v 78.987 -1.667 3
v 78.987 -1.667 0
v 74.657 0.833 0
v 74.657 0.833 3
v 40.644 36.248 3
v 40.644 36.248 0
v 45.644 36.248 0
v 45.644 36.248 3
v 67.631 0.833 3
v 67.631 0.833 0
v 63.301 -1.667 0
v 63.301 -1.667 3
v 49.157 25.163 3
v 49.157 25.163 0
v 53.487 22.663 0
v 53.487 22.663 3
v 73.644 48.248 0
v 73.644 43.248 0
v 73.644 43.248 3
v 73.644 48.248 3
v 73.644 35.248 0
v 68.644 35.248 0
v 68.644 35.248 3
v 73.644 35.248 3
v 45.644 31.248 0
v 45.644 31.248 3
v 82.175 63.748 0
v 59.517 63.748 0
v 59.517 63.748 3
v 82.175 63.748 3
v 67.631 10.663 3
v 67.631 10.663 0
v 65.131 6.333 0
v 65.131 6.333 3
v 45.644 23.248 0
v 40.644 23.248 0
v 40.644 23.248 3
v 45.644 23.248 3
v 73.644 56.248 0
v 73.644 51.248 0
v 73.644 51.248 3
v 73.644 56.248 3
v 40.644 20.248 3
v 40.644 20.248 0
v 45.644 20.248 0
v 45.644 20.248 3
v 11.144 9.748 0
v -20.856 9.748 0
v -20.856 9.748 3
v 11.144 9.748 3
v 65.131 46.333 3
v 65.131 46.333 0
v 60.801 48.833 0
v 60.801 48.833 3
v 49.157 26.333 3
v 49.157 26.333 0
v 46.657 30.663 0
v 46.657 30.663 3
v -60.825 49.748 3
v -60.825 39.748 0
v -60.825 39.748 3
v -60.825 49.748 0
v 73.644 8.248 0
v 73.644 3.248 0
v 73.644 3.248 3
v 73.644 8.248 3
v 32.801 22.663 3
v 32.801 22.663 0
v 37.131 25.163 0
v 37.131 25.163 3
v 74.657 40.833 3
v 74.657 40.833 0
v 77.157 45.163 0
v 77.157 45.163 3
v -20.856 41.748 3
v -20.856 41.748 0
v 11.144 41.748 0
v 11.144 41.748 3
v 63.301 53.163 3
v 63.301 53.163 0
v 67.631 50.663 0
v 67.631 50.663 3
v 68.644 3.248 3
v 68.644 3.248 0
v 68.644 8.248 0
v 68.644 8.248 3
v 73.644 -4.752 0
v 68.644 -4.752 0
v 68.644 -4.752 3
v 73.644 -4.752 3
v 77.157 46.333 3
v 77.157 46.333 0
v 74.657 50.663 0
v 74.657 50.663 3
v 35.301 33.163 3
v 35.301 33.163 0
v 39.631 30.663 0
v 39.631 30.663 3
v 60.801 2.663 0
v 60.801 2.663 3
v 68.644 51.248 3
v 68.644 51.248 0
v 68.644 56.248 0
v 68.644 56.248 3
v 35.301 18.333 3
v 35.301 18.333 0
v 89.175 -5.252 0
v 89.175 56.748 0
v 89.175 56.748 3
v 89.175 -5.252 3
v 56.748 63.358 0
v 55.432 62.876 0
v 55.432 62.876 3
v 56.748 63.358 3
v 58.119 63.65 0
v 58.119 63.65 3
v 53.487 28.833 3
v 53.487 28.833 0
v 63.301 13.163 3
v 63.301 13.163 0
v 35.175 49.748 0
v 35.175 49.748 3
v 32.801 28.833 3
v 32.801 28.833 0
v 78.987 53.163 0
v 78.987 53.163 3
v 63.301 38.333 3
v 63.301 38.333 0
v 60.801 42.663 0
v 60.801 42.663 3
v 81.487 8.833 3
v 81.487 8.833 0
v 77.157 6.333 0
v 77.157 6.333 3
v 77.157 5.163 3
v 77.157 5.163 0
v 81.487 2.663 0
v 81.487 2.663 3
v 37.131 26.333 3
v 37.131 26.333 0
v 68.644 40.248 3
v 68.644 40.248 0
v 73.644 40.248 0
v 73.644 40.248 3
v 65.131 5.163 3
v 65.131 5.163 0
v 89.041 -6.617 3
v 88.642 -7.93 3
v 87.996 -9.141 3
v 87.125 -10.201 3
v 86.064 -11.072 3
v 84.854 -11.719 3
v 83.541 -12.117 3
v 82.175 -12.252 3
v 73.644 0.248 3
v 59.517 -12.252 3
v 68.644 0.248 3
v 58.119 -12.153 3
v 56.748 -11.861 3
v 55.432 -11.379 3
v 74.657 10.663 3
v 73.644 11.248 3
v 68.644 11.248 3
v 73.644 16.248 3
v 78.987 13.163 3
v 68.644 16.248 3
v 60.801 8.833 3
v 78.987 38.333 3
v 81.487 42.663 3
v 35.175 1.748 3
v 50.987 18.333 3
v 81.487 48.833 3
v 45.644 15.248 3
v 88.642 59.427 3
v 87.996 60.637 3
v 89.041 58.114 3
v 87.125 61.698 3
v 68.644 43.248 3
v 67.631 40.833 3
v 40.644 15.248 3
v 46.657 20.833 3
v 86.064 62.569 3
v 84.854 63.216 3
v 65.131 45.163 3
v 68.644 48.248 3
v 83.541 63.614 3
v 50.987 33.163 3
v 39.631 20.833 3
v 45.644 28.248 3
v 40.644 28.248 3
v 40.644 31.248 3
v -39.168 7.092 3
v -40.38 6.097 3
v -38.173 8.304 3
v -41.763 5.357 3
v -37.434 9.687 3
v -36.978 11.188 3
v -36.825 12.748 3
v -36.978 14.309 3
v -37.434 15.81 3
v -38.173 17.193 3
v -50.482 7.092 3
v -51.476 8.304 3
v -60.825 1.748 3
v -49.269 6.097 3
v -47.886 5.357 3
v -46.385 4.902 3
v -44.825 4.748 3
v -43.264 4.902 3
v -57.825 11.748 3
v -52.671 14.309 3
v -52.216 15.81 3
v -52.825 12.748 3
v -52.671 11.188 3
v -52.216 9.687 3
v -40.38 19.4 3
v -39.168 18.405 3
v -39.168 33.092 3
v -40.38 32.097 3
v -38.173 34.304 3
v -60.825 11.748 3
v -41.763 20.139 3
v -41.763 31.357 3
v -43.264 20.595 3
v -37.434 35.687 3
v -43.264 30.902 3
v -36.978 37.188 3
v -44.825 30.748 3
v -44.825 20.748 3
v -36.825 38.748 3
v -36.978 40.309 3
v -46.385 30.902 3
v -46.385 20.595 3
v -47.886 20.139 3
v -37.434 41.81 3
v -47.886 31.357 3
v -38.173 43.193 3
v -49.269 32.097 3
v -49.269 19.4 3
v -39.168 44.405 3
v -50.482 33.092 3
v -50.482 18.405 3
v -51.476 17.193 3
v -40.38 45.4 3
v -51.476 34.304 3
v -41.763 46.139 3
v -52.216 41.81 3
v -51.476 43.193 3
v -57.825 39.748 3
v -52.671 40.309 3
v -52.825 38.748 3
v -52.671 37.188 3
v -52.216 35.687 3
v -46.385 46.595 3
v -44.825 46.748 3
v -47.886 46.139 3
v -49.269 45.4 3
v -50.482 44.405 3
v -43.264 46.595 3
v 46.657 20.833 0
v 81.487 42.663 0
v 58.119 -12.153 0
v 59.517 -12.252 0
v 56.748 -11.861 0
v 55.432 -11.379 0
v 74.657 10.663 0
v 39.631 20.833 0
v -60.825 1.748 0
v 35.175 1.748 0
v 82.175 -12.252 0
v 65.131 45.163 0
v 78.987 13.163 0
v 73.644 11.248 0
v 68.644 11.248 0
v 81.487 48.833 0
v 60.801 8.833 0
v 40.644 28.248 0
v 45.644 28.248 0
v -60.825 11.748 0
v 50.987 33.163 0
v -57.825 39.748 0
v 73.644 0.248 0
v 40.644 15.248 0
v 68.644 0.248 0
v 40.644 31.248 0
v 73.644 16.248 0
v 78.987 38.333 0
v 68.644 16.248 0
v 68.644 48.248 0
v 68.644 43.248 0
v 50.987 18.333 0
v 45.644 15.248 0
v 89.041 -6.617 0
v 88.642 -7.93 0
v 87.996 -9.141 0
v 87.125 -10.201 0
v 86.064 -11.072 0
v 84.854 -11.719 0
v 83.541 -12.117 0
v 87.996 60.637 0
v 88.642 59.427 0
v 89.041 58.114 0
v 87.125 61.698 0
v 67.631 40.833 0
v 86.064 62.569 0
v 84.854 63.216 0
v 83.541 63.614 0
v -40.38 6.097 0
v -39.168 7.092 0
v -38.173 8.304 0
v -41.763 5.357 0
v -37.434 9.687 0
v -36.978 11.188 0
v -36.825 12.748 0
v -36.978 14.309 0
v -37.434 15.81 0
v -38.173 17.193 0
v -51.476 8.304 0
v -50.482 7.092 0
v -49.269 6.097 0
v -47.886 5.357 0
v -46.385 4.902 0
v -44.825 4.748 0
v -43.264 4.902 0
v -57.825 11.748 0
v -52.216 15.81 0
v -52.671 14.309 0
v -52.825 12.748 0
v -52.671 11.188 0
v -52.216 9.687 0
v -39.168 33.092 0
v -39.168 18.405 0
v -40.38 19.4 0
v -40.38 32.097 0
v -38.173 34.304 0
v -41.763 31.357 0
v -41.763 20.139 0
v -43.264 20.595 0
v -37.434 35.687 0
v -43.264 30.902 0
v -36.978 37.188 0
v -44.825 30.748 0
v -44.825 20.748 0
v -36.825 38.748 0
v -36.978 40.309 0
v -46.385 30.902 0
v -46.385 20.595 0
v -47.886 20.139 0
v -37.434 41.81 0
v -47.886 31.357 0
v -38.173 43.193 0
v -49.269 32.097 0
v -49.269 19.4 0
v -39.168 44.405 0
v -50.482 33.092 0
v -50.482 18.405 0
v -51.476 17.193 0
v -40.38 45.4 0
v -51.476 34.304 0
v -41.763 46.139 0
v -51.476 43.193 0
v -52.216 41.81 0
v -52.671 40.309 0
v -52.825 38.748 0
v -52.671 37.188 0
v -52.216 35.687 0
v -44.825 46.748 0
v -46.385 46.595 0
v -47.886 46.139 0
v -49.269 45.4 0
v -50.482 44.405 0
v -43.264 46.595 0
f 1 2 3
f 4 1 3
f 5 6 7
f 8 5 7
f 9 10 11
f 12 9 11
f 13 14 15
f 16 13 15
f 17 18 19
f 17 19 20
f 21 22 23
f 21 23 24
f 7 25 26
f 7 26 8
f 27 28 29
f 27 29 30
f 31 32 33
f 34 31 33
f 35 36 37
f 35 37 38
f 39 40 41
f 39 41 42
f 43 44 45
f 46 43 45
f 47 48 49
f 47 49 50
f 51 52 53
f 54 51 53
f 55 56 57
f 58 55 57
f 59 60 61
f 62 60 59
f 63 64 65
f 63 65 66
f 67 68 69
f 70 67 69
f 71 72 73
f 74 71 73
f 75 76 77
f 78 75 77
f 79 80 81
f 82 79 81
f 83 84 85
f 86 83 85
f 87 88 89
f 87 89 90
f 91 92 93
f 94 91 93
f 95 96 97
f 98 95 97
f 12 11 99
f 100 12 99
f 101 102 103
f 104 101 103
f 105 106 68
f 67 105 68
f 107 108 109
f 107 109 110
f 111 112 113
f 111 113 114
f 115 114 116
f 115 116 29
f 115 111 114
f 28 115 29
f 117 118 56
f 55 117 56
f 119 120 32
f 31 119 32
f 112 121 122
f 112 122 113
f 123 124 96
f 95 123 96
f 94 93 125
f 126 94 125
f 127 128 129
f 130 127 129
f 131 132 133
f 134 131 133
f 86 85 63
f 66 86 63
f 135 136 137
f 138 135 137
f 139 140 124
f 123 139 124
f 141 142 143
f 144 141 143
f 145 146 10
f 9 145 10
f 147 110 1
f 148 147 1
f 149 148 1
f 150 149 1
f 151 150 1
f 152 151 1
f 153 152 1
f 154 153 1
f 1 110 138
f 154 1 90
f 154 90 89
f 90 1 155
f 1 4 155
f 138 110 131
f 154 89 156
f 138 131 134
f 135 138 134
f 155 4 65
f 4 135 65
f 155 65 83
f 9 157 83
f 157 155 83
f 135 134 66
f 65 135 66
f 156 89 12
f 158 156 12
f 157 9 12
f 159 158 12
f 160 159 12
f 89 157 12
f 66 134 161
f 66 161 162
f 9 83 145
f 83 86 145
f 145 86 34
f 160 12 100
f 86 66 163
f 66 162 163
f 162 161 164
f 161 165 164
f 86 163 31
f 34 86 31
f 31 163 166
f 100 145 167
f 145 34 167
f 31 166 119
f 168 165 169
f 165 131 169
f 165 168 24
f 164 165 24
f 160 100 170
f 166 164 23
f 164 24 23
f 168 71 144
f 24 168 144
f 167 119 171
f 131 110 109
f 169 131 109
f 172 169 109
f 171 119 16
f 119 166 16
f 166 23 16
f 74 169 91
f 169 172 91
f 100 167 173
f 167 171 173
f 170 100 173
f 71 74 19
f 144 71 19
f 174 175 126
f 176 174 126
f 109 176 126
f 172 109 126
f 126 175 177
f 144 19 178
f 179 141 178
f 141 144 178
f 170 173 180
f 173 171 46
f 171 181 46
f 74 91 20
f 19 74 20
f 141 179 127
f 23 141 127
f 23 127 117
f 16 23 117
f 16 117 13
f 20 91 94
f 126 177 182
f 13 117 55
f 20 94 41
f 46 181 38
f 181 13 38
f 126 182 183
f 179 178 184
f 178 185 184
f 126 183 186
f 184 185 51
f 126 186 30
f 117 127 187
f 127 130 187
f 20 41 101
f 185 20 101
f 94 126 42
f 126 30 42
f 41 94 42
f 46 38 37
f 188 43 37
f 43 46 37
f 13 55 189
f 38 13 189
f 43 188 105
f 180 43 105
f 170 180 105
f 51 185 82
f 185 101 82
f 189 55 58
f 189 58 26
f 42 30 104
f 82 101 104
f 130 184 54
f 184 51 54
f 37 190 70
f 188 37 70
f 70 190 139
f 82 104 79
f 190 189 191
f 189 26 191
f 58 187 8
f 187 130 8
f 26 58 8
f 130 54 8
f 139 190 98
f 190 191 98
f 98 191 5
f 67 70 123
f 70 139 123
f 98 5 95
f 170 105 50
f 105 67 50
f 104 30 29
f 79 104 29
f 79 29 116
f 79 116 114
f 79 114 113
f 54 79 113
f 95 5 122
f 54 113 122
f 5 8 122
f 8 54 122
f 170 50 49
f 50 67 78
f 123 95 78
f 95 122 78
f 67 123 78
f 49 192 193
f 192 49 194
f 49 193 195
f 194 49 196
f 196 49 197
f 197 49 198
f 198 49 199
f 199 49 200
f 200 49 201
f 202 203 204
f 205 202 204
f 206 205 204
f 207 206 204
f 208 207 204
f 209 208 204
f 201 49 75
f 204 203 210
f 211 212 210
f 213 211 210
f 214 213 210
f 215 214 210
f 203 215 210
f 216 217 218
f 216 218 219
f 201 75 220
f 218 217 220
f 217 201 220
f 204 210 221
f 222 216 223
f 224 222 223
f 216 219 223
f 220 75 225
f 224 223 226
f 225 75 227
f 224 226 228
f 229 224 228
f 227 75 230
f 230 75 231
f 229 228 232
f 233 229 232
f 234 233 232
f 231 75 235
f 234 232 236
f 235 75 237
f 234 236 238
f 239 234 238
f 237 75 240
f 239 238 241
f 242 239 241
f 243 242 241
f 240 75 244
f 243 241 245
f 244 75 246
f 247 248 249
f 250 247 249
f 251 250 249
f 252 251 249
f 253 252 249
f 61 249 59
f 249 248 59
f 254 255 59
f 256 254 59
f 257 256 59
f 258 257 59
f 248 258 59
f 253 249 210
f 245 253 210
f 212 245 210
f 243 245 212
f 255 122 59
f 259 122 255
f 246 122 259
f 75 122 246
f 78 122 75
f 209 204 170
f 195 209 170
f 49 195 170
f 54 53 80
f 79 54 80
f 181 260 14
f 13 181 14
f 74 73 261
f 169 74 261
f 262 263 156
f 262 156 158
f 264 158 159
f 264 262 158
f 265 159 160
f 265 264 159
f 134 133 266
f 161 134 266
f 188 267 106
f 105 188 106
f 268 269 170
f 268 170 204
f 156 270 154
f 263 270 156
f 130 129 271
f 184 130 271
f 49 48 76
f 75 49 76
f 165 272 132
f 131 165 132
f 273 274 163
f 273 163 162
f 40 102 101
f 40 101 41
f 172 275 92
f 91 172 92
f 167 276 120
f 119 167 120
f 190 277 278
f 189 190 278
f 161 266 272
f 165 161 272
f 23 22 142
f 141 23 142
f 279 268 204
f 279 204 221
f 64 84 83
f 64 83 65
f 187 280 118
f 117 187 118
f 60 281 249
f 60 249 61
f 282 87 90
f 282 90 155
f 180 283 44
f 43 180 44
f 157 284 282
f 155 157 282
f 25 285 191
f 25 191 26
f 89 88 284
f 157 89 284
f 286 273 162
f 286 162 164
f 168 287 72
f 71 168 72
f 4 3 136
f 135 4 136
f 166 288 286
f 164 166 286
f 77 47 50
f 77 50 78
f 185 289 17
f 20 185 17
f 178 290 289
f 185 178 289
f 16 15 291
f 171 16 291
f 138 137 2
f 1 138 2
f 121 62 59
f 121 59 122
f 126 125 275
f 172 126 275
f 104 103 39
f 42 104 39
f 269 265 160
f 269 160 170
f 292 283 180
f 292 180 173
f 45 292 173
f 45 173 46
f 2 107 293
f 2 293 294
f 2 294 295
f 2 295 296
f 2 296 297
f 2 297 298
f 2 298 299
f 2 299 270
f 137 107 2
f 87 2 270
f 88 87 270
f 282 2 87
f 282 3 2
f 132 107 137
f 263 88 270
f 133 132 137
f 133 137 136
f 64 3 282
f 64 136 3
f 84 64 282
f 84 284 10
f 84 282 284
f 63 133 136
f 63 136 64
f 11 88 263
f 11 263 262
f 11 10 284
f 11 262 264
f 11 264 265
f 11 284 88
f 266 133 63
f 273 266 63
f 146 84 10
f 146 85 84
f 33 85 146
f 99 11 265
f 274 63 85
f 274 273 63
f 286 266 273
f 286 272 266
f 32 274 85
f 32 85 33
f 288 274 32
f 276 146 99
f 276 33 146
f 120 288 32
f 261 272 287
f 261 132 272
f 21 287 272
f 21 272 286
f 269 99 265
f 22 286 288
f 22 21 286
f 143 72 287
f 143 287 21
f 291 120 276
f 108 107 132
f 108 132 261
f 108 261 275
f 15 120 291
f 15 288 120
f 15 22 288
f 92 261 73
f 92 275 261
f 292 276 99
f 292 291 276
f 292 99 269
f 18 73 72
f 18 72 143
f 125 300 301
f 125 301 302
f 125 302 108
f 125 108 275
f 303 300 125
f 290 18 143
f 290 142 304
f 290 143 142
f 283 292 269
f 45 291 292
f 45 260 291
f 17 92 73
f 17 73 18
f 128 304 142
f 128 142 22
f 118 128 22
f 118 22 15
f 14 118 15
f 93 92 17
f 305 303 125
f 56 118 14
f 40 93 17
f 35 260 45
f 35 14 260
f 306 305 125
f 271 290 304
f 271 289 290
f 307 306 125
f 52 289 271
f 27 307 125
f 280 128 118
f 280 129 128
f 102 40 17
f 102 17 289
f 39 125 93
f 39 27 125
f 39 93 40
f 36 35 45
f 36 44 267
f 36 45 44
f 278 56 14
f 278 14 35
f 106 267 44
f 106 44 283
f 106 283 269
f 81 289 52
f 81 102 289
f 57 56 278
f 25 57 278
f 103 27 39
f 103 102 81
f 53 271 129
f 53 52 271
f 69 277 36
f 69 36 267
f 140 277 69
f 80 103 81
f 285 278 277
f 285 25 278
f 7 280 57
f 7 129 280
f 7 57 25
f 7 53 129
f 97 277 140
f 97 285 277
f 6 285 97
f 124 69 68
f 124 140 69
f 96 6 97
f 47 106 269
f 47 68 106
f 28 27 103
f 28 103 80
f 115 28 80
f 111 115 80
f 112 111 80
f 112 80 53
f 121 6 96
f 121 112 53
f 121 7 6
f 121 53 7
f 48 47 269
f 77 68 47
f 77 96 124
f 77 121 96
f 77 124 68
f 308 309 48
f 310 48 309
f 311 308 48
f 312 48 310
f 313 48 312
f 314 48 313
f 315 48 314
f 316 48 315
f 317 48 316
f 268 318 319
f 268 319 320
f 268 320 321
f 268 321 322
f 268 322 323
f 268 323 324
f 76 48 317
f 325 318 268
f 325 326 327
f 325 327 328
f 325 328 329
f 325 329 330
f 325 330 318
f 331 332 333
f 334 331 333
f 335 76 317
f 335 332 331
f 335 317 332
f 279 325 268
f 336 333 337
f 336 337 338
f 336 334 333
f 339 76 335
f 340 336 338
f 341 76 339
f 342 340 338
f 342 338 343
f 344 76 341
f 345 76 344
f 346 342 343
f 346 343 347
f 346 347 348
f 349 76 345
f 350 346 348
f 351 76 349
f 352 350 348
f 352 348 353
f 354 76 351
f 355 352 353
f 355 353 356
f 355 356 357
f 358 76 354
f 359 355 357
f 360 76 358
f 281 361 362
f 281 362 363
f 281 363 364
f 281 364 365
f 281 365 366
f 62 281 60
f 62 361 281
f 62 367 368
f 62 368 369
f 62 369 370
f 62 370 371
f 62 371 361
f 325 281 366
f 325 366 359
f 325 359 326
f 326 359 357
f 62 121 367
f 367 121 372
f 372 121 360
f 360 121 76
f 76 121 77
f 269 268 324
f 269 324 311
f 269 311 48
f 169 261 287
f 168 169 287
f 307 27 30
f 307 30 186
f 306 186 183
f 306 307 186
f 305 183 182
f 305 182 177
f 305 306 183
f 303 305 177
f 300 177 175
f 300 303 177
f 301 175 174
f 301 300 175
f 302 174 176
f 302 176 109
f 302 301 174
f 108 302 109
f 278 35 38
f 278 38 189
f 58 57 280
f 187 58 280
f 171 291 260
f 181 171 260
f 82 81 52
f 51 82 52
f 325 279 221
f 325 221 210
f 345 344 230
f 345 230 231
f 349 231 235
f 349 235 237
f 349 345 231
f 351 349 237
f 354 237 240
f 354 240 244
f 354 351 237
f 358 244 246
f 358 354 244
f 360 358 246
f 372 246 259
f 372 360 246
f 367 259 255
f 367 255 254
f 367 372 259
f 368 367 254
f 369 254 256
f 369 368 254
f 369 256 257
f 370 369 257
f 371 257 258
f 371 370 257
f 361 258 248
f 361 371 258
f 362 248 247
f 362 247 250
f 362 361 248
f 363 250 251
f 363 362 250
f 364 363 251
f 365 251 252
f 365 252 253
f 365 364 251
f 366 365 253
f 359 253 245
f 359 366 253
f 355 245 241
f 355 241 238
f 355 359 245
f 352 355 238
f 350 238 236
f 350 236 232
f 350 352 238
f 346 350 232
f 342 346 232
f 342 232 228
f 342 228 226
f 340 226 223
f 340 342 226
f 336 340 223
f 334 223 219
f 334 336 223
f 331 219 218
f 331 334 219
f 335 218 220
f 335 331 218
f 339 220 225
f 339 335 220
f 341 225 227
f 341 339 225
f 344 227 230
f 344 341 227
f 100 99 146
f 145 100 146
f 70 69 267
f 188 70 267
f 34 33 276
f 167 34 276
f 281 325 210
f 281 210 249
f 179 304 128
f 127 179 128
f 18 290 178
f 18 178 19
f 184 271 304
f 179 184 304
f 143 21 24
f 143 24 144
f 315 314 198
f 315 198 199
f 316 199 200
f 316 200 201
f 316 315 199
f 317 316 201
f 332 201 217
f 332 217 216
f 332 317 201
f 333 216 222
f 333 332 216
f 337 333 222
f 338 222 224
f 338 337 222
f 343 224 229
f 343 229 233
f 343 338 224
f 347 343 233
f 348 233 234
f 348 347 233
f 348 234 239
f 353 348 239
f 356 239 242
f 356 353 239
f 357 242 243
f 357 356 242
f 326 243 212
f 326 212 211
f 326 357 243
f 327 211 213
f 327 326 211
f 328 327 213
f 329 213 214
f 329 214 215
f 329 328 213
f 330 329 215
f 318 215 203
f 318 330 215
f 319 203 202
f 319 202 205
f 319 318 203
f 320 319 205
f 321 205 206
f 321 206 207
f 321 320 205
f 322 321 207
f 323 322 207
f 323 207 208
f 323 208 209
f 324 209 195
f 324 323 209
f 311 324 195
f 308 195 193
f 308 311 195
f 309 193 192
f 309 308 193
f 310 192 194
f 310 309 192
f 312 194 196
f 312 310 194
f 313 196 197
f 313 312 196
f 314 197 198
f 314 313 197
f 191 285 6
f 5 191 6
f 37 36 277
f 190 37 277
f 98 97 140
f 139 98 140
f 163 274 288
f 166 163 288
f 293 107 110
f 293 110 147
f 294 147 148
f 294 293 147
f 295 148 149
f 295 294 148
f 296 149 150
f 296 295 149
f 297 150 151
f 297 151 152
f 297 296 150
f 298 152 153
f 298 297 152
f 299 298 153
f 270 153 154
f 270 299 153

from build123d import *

# Parameters (mm, degrees)
MODEL_R                 = 8
MODEL_W                 = 32
MODEL_H                 = 32
MODEL_W_2               = 5
MODEL_H_2               = 5
SALIENTE_EXTRUIR1_DEPTH = 3


with BuildPart() as part:
    # Model → Saliente-Extruir1 (new body)
    with BuildSketch(Plane.XY):
        with BuildLine():
            Line((-57.824686592, 11.748368167), (-57.824686592, 39.748368167))
            Line((-57.824686592, 39.748368167), (-60.824686592, 39.748368167))
            Line((-60.824686592, 39.748368167), (-60.824686592, 49.748368167))
            Line((-60.824686592, 49.748368167), (35.175313408, 49.748368167))
            Line((35.175313408, 49.748368167), (55.431974906, 62.876149377))
            ThreePointArc((55.431974906, 62.876149377), (57.428209194, 63.52788278), (59.516532433, 63.748368167))
            Line((59.516532433, 63.748368167), (82.175313408, 63.748368167))
            ThreePointArc((82.175313408, 63.748368167), (87.125060876, 61.698115636), (89.175313408, 56.748368167))
            Line((89.175313408, 56.748368167), (89.175313408, -5.251631833))
            ThreePointArc((89.175313408, -5.251631833), (87.125060876, -10.201379301), (82.175313408, -12.251631833))
            Line((82.175313408, -12.251631833), (59.516532433, -12.251631833))
            ThreePointArc((59.516532433, -12.251631833), (57.428209194, -12.031146445), (55.431974906, -11.379413042))
            Line((55.431974906, -11.379413042), (35.175313408, 1.748368167))
            Line((35.175313408, 1.748368167), (-60.824686592, 1.748368167))
            Line((-60.824686592, 1.748368167), (-60.824686592, 11.748368167))
            Line((-60.824686592, 11.748368167), (-57.824686592, 11.748368167))
        make_face()
        with Locations((-44.824686592, 12.748368167)):
            Circle(MODEL_R, mode=Mode.SUBTRACT)
        with Locations((-44.824686592, 38.748368167)):
            Circle(MODEL_R, mode=Mode.SUBTRACT)
        with Locations((-4.85604759, 25.748368167)):
            Rectangle(MODEL_W, MODEL_H, mode=Mode.SUBTRACT)
        Polygon((65.130812689, 45.163431677), (67.630812689, 40.833304658), (63.300685671, 38.333304658), (60.800685671, 42.663431677), align=None, mode=Mode.SUBTRACT)
        Polygon((65.130812689, 5.163431677), (67.630812689, 0.833304658), (63.300685671, -1.666695342), (60.800685671, 2.663431677), align=None, mode=Mode.SUBTRACT)
        Polygon((37.130812689, 25.163431677), (39.630812689, 20.833304658), (35.300685671, 18.333304658), (32.800685671, 22.663431677), align=None, mode=Mode.SUBTRACT)
        Polygon((60.800685671, 48.833304658), (63.300685671, 53.163431677), (67.630812689, 50.663431677), (65.130812689, 46.333304658), align=None, mode=Mode.SUBTRACT)
        Polygon((60.800685671, 8.833304658), (63.300685671, 13.163431677), (67.630812689, 10.663431677), (65.130812689, 6.333304658), align=None, mode=Mode.SUBTRACT)
        Polygon((32.800685671, 28.833304658), (35.300685671, 33.163431677), (39.630812689, 30.663431677), (37.130812689, 26.333304658), align=None, mode=Mode.SUBTRACT)
        with Locations((71.14395241, 37.748368167)):
            Rectangle(MODEL_W_2, MODEL_H_2, mode=Mode.SUBTRACT)
        with Locations((71.14395241, -2.251631833)):
            Rectangle(MODEL_W_2, MODEL_H_2, mode=Mode.SUBTRACT)
        with Locations((43.14395241, 17.748368167)):
            Rectangle(MODEL_W_2, MODEL_H_2, mode=Mode.SUBTRACT)
        Polygon((77.157092131, 46.333304658), (74.657092131, 50.663431677), (78.98721915, 53.163431677), (81.48721915, 48.833304658), align=None, mode=Mode.SUBTRACT)
        Polygon((77.157092131, 6.333304658), (74.657092131, 10.663431677), (78.98721915, 13.163431677), (81.48721915, 8.833304658), align=None, mode=Mode.SUBTRACT)
        Polygon((49.157092131, 26.333304658), (46.657092131, 30.663431677), (50.98721915, 33.163431677), (53.48721915, 28.833304658), align=None, mode=Mode.SUBTRACT)
        Polygon((81.48721915, 42.663431677), (78.98721915, 38.333304658), (74.657092131, 40.833304658), (77.157092131, 45.163431677), align=None, mode=Mode.SUBTRACT)
        Polygon((81.48721915, 2.663431677), (78.98721915, -1.666695342), (74.657092131, 0.833304658), (77.157092131, 5.163431677), align=None, mode=Mode.SUBTRACT)
        Polygon((53.48721915, 22.663431677), (50.98721915, 18.333304658), (46.657092131, 20.833304658), (49.157092131, 25.163431677), align=None, mode=Mode.SUBTRACT)
        with Locations((71.14395241, 13.748368167)):
            Rectangle(MODEL_W_2, MODEL_H_2, mode=Mode.SUBTRACT)
        with Locations((43.14395241, 33.748368167)):
            Rectangle(MODEL_W_2, MODEL_H_2, mode=Mode.SUBTRACT)
        with Locations((71.14395241, 53.748368167)):
            Rectangle(MODEL_W_2, MODEL_H_2, mode=Mode.SUBTRACT)
        with Locations((71.14395241, 5.748368167)):
            Rectangle(MODEL_W_2, MODEL_H_2, mode=Mode.SUBTRACT)
        with Locations((43.14395241, 25.748368167)):
            Rectangle(MODEL_W_2, MODEL_H_2, mode=Mode.SUBTRACT)
        with Locations((71.14395241, 45.748368167)):
            Rectangle(MODEL_W_2, MODEL_H_2, mode=Mode.SUBTRACT)
    extrude(amount=SALIENTE_EXTRUIR1_DEPTH)


solid = part.part
